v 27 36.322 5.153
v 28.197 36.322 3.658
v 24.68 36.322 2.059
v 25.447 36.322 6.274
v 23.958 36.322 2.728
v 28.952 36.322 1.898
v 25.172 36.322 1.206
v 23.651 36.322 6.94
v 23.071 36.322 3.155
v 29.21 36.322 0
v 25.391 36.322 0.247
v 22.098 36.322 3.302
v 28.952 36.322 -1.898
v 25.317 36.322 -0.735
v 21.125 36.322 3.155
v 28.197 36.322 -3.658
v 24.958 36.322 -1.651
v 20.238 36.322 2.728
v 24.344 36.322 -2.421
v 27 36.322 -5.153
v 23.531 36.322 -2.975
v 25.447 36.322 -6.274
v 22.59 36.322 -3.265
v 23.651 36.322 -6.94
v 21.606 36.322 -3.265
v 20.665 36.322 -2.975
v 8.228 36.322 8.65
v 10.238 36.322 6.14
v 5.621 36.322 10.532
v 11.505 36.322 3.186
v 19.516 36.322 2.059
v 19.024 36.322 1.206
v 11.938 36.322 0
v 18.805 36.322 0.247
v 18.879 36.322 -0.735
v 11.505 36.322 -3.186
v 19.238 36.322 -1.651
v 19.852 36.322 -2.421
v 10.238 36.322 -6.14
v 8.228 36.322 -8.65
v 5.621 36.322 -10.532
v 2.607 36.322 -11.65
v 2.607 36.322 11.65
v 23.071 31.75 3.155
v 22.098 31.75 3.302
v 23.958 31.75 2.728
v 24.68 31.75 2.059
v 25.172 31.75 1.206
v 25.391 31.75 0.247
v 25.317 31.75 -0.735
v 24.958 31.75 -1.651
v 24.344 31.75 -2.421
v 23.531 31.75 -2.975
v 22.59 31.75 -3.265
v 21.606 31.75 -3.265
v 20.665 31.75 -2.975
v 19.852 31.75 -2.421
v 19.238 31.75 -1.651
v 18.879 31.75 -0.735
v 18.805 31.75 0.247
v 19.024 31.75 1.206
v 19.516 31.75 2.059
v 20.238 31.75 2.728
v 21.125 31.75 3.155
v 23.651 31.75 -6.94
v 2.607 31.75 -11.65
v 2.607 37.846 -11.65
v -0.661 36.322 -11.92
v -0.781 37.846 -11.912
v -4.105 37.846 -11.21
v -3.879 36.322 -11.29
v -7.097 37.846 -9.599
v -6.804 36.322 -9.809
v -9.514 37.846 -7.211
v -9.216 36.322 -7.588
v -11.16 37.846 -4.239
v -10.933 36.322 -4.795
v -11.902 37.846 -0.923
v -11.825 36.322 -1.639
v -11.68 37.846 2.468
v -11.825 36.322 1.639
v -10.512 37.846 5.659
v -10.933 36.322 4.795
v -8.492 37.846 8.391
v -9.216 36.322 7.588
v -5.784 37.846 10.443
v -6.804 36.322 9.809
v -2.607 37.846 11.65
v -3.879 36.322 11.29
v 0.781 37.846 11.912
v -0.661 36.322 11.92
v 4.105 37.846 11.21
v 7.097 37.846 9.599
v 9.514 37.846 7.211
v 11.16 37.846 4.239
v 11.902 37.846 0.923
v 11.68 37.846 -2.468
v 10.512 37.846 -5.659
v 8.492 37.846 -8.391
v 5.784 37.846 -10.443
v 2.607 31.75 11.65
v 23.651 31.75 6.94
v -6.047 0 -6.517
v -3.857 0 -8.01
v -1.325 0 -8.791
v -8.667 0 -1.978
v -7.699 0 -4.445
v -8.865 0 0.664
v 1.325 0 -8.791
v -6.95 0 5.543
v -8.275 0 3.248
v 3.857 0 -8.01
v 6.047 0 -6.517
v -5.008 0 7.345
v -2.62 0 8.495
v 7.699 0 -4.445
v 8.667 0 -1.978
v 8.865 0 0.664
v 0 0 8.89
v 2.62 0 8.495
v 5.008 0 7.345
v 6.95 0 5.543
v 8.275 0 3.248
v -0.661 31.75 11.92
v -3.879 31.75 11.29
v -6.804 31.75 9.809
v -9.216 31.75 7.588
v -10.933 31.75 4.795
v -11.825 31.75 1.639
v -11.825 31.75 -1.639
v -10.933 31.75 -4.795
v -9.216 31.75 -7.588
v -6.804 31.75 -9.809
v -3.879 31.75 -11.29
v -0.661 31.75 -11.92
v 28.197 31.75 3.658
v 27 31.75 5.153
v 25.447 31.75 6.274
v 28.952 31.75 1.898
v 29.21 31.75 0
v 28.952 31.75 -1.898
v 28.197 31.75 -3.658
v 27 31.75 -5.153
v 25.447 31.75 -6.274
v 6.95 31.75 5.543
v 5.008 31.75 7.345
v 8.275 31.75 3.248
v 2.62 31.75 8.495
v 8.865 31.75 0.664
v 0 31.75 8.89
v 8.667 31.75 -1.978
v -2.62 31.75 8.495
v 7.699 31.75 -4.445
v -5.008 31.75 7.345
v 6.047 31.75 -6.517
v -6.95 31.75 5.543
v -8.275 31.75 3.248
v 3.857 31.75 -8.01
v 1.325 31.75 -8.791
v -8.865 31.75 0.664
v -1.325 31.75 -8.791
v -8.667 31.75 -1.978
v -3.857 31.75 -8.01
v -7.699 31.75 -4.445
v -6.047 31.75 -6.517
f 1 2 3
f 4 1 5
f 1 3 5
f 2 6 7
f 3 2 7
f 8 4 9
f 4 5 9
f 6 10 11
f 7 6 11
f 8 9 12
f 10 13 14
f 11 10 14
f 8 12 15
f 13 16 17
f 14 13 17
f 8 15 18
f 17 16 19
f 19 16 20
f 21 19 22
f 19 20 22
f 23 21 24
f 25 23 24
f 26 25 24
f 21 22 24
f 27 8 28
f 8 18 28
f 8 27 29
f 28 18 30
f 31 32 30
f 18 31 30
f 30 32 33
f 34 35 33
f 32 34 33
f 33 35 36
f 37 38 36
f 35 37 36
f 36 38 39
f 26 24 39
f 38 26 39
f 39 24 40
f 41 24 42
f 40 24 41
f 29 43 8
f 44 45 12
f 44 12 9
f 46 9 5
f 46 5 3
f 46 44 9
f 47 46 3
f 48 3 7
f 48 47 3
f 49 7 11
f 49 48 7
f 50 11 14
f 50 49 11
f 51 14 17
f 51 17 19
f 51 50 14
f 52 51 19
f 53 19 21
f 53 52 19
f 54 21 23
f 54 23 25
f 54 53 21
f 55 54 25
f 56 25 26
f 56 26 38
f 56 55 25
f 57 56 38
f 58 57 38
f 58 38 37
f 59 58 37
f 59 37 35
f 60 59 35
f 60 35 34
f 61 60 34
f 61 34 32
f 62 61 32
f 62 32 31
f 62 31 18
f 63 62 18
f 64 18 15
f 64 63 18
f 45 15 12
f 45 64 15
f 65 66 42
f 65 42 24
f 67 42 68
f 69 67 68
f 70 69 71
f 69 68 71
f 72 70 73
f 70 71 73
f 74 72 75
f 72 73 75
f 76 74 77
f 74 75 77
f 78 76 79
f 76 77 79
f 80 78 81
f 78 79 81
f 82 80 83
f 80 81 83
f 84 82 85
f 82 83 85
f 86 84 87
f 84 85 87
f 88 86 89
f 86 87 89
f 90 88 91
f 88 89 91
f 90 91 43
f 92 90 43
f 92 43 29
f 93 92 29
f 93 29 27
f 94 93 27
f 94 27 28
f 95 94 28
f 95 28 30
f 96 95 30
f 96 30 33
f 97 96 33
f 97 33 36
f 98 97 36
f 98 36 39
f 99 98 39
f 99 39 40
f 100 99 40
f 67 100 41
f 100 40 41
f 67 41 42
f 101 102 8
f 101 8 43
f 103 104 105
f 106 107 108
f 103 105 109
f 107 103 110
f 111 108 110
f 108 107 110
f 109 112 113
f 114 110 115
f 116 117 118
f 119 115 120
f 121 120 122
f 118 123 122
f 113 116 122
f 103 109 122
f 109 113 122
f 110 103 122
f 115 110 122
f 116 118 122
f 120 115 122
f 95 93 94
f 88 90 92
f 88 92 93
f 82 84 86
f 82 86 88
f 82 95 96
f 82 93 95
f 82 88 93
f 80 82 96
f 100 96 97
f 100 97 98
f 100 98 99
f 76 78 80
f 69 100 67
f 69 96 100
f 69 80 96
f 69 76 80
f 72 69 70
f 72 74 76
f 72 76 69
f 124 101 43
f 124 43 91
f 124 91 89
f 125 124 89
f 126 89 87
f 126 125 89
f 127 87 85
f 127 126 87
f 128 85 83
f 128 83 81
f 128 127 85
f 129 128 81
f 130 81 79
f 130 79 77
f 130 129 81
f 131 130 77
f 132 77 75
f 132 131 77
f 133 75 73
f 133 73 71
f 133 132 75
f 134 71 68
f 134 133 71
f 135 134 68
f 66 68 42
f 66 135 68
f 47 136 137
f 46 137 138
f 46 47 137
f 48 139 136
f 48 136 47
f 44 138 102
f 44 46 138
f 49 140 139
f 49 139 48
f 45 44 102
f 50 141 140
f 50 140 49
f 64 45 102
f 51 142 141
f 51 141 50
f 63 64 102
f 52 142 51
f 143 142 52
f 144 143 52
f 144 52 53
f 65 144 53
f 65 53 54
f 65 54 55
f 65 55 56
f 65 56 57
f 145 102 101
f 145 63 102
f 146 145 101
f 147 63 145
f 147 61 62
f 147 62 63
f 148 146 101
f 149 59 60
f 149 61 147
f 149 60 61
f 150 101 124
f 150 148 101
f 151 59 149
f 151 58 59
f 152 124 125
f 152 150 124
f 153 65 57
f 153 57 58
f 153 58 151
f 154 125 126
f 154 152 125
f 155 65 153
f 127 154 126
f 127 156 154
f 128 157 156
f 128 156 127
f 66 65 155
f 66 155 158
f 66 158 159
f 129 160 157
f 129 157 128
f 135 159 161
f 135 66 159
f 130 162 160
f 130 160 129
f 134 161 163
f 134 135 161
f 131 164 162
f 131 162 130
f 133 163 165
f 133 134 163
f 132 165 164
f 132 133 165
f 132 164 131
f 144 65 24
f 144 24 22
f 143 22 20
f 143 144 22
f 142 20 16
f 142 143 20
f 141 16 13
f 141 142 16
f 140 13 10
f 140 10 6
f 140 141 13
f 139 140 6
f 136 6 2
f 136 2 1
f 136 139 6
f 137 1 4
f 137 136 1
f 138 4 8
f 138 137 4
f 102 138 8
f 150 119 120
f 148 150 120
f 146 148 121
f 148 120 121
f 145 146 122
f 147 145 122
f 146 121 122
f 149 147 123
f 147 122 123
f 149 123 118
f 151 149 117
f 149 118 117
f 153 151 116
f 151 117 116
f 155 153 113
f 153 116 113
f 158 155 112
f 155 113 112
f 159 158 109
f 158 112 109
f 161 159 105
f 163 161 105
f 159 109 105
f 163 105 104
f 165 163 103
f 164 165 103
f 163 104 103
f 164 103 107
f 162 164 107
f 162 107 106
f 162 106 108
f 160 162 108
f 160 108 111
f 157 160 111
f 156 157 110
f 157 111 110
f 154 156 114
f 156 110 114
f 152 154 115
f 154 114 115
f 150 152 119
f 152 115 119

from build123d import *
from build123d.topology import SkipClean

# Parameters (mm, degrees)
SKETCH1_R           = 8.89
BOSS_EXTRUDE1_DEPTH = 31.75
SKETCH2_R           = 3.302
BOSS_EXTRUDE2_DEPTH = 4.572
SKETCH3_R           = 11.938
BOSS_EXTRUDE3_DEPTH = 1.524


with BuildPart() as part:
    # Sketch1 → Boss-Extrude1 (new body)
    with BuildSketch(Plane(origin=(0, 0, 0), x_dir=(1, 0, 0), z_dir=(0, 1, 0))):
        with Locations(Location((0, 0, 0), (0, 0, 270))):
            Circle(SKETCH1_R)
    extrude(amount=BOSS_EXTRUDE1_DEPTH)

    # Sketch2 → Boss-Extrude2 (add)
    with BuildSketch(Plane(origin=(0, 31.75, 0), x_dir=(1, 0, 0), z_dir=(0, 1, 0))):
        with BuildLine():
            Line((2.607149425, 11.649833298), (23.651195402, 6.94032622))
            ThreePointArc((23.651195402, 6.94032622), (29.21, 0), (23.651195402, -6.94032622))
            Line((23.651195402, -6.94032622), (2.607149425, -11.649833298))
            ThreePointArc((2.607149425, -11.649833298), (-11.938, 0), (2.607149425, 11.649833298))
        make_face()
        with Locations(Location((22.098, 0, 0), (0, 0, 270))):
            Circle(SKETCH2_R, mode=Mode.SUBTRACT)
    extrude(amount=BOSS_EXTRUDE2_DEPTH)

    # Sketch3 → Boss-Extrude3 (add)
    with SkipClean():  # the faces are left unmerged after this step: merging them gives an invalid solid
        with BuildSketch(Plane(origin=(0, 36.322, 0), x_dir=(1, 0, 0), z_dir=(0, 1, 0))):
            with Locations(Location((0, 0, 0), (0, 0, 77.385465227))):
                Circle(SKETCH3_R)
        extrude(amount=BOSS_EXTRUDE3_DEPTH)


solid = part.part
